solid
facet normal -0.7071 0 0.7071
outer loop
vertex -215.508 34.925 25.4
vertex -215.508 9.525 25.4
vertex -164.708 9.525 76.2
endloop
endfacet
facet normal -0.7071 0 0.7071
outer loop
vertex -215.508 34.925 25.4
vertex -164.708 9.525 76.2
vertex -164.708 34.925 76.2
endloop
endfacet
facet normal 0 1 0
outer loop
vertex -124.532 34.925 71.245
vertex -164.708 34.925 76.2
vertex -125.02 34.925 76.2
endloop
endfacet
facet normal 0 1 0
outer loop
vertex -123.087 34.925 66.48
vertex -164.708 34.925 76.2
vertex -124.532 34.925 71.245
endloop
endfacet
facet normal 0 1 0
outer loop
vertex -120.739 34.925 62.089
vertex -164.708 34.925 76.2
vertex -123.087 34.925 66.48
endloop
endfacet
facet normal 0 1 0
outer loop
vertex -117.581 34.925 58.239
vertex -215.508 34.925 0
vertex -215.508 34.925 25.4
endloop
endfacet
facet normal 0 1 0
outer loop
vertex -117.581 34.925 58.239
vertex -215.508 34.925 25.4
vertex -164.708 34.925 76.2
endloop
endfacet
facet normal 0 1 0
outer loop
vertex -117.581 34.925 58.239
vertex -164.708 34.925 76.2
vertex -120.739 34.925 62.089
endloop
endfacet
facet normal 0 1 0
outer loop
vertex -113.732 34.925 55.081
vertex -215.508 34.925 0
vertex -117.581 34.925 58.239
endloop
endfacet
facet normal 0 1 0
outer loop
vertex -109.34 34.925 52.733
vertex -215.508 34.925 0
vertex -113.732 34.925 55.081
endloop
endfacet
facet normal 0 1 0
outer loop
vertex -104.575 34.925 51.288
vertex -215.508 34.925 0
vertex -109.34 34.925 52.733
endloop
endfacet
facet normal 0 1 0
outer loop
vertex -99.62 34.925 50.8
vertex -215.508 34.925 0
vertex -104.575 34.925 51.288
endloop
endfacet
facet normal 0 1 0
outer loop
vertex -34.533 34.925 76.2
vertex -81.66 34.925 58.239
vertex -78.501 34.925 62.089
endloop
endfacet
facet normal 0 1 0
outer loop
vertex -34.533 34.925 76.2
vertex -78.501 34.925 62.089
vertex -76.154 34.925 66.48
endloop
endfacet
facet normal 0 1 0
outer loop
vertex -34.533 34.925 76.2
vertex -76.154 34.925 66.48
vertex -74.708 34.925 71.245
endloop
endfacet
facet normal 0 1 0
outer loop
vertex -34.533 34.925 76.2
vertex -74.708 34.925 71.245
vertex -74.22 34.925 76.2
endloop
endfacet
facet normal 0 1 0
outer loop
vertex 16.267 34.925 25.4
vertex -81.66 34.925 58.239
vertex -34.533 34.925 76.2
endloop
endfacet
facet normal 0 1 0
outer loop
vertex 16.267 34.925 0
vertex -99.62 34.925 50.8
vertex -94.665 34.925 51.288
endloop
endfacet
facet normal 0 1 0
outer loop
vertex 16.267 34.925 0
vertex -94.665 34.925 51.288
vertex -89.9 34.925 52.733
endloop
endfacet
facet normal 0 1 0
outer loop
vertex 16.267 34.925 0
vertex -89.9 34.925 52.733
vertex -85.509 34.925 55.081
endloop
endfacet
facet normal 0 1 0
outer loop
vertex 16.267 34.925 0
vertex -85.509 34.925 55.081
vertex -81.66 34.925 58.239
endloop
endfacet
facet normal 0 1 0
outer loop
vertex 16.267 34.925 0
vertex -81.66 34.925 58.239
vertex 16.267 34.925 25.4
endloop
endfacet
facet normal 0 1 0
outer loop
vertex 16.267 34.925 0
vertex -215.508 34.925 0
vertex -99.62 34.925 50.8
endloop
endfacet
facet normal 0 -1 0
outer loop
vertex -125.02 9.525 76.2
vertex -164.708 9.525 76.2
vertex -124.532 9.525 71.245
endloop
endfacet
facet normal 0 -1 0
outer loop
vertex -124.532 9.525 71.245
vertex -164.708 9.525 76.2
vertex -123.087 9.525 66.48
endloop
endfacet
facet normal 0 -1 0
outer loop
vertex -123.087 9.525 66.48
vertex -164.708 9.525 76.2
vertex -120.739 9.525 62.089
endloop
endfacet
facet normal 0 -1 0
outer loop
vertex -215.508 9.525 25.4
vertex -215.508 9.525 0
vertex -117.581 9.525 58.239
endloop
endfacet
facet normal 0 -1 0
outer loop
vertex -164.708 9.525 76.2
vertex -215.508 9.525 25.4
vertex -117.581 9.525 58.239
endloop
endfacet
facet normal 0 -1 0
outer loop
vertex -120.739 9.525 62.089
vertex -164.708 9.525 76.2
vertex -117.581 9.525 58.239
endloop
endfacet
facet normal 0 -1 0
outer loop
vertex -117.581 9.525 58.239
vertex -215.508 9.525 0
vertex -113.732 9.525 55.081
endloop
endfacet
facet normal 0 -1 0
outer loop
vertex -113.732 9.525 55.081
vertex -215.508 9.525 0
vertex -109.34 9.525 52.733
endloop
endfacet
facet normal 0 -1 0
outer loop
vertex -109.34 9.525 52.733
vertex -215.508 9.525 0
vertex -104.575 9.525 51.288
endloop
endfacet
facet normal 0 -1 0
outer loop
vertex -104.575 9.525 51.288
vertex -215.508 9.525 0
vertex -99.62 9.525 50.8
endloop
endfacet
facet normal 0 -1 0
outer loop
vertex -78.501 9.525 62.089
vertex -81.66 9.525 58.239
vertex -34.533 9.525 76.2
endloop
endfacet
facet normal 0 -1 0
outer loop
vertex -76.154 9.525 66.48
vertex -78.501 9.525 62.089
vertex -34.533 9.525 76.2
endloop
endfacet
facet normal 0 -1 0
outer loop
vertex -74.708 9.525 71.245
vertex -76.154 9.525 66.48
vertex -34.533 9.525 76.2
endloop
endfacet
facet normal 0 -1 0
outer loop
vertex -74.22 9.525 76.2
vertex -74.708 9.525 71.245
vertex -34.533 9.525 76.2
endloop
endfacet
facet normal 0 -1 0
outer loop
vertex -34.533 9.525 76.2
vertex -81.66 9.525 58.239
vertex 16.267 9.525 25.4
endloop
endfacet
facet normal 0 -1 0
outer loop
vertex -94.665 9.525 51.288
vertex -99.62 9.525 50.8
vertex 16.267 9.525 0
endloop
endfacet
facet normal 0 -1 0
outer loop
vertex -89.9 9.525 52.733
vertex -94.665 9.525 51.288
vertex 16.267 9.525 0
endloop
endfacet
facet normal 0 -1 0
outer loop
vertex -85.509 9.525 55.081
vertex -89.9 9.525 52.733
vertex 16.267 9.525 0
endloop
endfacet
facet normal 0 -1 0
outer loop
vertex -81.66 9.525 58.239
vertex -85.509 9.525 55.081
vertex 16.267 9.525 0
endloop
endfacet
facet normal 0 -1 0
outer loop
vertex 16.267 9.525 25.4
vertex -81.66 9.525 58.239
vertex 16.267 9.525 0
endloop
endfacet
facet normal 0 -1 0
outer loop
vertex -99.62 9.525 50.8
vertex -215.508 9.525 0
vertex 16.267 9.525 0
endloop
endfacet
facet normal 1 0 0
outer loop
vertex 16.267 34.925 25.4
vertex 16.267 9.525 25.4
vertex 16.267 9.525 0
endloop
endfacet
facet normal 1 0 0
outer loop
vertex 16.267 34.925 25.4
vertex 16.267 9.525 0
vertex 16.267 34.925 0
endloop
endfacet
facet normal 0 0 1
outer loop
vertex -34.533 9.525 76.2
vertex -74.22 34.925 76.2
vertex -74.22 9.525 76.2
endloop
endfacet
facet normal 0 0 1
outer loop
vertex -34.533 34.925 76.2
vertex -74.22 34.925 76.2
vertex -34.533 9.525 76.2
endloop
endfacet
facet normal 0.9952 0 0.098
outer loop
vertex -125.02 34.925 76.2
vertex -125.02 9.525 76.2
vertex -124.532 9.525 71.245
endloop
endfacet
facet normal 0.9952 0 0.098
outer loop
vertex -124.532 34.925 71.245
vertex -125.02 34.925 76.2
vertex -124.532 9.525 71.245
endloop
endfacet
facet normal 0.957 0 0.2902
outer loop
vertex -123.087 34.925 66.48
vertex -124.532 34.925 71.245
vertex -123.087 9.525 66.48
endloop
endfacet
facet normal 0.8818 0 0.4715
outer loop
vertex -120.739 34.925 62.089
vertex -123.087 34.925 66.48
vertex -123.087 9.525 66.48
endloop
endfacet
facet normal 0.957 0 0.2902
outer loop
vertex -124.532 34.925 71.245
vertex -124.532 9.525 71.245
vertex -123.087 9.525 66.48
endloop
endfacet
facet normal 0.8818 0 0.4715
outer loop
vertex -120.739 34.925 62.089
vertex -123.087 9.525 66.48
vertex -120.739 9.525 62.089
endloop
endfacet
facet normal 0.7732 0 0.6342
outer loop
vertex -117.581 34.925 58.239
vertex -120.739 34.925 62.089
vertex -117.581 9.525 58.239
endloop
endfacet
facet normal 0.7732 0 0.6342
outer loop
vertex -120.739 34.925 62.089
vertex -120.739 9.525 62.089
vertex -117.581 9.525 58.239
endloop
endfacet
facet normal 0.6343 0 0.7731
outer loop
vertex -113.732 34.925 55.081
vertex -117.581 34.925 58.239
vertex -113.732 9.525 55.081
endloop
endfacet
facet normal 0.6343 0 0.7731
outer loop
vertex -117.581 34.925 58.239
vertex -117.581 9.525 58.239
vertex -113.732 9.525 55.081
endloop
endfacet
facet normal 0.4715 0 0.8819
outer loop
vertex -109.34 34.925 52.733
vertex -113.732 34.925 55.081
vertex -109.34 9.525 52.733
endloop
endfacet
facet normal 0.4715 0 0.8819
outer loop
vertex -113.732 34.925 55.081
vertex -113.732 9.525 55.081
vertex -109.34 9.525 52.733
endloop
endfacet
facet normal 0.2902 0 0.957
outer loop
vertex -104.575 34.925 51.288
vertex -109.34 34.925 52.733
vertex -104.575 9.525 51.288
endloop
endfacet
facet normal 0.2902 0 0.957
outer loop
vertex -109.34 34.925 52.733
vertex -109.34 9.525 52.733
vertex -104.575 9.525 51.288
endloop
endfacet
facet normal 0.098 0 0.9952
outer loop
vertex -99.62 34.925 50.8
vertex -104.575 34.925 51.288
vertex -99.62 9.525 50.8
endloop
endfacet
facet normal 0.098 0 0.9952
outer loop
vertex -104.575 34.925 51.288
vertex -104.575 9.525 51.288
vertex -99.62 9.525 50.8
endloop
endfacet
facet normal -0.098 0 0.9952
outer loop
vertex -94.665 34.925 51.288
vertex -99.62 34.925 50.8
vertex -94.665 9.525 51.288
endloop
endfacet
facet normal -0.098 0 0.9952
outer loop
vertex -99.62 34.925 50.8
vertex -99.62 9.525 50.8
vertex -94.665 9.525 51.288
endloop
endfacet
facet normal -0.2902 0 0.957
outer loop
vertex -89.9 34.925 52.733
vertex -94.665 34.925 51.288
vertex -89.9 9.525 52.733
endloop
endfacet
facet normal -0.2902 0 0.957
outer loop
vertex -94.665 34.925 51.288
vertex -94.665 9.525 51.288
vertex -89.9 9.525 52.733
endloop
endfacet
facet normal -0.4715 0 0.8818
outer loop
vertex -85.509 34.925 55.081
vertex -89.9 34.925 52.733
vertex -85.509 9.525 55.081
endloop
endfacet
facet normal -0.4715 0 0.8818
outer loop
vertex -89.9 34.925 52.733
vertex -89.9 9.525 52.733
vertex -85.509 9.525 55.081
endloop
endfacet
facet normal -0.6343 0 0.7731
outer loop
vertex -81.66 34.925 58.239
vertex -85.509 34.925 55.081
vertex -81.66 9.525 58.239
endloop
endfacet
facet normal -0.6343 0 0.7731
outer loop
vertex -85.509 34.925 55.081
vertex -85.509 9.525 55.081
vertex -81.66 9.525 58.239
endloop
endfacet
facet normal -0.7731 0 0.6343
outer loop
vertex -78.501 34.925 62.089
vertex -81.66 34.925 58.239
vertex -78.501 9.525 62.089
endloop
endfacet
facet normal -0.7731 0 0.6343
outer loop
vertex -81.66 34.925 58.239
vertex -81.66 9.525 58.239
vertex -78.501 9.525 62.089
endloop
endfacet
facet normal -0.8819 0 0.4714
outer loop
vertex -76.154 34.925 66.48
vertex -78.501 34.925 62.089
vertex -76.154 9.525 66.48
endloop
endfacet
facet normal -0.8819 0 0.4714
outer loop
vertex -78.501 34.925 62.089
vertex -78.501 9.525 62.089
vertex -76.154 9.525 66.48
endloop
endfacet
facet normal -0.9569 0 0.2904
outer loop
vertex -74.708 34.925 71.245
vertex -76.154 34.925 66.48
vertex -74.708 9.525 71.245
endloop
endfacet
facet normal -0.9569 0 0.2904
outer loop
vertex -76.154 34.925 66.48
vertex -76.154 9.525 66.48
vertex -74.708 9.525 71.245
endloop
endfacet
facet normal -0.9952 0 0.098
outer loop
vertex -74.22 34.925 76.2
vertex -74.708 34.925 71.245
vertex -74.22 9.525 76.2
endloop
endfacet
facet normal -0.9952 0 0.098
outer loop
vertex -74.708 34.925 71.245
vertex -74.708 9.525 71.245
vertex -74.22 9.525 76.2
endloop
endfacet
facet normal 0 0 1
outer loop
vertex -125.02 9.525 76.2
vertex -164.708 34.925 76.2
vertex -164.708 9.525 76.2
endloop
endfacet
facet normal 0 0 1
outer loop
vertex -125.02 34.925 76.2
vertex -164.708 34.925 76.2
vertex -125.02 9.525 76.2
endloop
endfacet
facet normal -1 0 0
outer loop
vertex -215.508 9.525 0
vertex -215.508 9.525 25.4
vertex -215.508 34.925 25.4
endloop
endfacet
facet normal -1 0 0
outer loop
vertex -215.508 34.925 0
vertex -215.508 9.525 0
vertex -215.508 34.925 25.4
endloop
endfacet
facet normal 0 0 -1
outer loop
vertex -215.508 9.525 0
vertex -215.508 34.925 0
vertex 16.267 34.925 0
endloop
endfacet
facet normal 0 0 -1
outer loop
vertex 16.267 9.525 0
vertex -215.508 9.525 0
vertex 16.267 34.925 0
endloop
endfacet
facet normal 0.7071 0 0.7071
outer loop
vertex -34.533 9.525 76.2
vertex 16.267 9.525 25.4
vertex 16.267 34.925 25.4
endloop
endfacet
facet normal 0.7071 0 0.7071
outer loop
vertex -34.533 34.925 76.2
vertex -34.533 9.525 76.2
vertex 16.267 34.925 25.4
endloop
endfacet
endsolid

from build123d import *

# Parameters (mm, degrees)
F0_W     = 231.775
F0_H     = 25.4
F1_DEPTH = 76.2
F2_SIZE  = 50.8
F4_DEPTH = 25.4


with BuildPart() as f1:
    # F0 (on Top) → F1 (new body)
    with BuildSketch(Plane.XY):
        with Locations((-99.620111, 22.224578)):
            Rectangle(F0_W, F0_H)
    extrude(amount=F1_DEPTH)

    # F2
    f2_edges = [f1.edges().sort_by_distance(p)[0] for p in [
        (-215.507611, 22.224578, 76.2),
        (16.267389, 22.224578, 76.2),
    ]]
    chamfer(f2_edges, length=F2_SIZE)

    # F3 (on face) → F4 (cut)
    with BuildSketch(Plane.XZ.offset(-9.524578)):
        with BuildLine():
            Line((-125.020111, 76.2), (-74.220111, 76.2))
            ThreePointArc((-74.220111, 76.2), (-99.620111, 101.6), (-125.020111, 76.2))
        make_face()
        with BuildLine():
            ThreePointArc((-125.020111, 76.2), (-99.620111, 50.8), (-74.220111, 76.2))
            Line((-74.220111, 76.2), (-125.020111, 76.2))
        make_face()
    extrude(amount=-F4_DEPTH, mode=Mode.SUBTRACT)


solid = f1.part
